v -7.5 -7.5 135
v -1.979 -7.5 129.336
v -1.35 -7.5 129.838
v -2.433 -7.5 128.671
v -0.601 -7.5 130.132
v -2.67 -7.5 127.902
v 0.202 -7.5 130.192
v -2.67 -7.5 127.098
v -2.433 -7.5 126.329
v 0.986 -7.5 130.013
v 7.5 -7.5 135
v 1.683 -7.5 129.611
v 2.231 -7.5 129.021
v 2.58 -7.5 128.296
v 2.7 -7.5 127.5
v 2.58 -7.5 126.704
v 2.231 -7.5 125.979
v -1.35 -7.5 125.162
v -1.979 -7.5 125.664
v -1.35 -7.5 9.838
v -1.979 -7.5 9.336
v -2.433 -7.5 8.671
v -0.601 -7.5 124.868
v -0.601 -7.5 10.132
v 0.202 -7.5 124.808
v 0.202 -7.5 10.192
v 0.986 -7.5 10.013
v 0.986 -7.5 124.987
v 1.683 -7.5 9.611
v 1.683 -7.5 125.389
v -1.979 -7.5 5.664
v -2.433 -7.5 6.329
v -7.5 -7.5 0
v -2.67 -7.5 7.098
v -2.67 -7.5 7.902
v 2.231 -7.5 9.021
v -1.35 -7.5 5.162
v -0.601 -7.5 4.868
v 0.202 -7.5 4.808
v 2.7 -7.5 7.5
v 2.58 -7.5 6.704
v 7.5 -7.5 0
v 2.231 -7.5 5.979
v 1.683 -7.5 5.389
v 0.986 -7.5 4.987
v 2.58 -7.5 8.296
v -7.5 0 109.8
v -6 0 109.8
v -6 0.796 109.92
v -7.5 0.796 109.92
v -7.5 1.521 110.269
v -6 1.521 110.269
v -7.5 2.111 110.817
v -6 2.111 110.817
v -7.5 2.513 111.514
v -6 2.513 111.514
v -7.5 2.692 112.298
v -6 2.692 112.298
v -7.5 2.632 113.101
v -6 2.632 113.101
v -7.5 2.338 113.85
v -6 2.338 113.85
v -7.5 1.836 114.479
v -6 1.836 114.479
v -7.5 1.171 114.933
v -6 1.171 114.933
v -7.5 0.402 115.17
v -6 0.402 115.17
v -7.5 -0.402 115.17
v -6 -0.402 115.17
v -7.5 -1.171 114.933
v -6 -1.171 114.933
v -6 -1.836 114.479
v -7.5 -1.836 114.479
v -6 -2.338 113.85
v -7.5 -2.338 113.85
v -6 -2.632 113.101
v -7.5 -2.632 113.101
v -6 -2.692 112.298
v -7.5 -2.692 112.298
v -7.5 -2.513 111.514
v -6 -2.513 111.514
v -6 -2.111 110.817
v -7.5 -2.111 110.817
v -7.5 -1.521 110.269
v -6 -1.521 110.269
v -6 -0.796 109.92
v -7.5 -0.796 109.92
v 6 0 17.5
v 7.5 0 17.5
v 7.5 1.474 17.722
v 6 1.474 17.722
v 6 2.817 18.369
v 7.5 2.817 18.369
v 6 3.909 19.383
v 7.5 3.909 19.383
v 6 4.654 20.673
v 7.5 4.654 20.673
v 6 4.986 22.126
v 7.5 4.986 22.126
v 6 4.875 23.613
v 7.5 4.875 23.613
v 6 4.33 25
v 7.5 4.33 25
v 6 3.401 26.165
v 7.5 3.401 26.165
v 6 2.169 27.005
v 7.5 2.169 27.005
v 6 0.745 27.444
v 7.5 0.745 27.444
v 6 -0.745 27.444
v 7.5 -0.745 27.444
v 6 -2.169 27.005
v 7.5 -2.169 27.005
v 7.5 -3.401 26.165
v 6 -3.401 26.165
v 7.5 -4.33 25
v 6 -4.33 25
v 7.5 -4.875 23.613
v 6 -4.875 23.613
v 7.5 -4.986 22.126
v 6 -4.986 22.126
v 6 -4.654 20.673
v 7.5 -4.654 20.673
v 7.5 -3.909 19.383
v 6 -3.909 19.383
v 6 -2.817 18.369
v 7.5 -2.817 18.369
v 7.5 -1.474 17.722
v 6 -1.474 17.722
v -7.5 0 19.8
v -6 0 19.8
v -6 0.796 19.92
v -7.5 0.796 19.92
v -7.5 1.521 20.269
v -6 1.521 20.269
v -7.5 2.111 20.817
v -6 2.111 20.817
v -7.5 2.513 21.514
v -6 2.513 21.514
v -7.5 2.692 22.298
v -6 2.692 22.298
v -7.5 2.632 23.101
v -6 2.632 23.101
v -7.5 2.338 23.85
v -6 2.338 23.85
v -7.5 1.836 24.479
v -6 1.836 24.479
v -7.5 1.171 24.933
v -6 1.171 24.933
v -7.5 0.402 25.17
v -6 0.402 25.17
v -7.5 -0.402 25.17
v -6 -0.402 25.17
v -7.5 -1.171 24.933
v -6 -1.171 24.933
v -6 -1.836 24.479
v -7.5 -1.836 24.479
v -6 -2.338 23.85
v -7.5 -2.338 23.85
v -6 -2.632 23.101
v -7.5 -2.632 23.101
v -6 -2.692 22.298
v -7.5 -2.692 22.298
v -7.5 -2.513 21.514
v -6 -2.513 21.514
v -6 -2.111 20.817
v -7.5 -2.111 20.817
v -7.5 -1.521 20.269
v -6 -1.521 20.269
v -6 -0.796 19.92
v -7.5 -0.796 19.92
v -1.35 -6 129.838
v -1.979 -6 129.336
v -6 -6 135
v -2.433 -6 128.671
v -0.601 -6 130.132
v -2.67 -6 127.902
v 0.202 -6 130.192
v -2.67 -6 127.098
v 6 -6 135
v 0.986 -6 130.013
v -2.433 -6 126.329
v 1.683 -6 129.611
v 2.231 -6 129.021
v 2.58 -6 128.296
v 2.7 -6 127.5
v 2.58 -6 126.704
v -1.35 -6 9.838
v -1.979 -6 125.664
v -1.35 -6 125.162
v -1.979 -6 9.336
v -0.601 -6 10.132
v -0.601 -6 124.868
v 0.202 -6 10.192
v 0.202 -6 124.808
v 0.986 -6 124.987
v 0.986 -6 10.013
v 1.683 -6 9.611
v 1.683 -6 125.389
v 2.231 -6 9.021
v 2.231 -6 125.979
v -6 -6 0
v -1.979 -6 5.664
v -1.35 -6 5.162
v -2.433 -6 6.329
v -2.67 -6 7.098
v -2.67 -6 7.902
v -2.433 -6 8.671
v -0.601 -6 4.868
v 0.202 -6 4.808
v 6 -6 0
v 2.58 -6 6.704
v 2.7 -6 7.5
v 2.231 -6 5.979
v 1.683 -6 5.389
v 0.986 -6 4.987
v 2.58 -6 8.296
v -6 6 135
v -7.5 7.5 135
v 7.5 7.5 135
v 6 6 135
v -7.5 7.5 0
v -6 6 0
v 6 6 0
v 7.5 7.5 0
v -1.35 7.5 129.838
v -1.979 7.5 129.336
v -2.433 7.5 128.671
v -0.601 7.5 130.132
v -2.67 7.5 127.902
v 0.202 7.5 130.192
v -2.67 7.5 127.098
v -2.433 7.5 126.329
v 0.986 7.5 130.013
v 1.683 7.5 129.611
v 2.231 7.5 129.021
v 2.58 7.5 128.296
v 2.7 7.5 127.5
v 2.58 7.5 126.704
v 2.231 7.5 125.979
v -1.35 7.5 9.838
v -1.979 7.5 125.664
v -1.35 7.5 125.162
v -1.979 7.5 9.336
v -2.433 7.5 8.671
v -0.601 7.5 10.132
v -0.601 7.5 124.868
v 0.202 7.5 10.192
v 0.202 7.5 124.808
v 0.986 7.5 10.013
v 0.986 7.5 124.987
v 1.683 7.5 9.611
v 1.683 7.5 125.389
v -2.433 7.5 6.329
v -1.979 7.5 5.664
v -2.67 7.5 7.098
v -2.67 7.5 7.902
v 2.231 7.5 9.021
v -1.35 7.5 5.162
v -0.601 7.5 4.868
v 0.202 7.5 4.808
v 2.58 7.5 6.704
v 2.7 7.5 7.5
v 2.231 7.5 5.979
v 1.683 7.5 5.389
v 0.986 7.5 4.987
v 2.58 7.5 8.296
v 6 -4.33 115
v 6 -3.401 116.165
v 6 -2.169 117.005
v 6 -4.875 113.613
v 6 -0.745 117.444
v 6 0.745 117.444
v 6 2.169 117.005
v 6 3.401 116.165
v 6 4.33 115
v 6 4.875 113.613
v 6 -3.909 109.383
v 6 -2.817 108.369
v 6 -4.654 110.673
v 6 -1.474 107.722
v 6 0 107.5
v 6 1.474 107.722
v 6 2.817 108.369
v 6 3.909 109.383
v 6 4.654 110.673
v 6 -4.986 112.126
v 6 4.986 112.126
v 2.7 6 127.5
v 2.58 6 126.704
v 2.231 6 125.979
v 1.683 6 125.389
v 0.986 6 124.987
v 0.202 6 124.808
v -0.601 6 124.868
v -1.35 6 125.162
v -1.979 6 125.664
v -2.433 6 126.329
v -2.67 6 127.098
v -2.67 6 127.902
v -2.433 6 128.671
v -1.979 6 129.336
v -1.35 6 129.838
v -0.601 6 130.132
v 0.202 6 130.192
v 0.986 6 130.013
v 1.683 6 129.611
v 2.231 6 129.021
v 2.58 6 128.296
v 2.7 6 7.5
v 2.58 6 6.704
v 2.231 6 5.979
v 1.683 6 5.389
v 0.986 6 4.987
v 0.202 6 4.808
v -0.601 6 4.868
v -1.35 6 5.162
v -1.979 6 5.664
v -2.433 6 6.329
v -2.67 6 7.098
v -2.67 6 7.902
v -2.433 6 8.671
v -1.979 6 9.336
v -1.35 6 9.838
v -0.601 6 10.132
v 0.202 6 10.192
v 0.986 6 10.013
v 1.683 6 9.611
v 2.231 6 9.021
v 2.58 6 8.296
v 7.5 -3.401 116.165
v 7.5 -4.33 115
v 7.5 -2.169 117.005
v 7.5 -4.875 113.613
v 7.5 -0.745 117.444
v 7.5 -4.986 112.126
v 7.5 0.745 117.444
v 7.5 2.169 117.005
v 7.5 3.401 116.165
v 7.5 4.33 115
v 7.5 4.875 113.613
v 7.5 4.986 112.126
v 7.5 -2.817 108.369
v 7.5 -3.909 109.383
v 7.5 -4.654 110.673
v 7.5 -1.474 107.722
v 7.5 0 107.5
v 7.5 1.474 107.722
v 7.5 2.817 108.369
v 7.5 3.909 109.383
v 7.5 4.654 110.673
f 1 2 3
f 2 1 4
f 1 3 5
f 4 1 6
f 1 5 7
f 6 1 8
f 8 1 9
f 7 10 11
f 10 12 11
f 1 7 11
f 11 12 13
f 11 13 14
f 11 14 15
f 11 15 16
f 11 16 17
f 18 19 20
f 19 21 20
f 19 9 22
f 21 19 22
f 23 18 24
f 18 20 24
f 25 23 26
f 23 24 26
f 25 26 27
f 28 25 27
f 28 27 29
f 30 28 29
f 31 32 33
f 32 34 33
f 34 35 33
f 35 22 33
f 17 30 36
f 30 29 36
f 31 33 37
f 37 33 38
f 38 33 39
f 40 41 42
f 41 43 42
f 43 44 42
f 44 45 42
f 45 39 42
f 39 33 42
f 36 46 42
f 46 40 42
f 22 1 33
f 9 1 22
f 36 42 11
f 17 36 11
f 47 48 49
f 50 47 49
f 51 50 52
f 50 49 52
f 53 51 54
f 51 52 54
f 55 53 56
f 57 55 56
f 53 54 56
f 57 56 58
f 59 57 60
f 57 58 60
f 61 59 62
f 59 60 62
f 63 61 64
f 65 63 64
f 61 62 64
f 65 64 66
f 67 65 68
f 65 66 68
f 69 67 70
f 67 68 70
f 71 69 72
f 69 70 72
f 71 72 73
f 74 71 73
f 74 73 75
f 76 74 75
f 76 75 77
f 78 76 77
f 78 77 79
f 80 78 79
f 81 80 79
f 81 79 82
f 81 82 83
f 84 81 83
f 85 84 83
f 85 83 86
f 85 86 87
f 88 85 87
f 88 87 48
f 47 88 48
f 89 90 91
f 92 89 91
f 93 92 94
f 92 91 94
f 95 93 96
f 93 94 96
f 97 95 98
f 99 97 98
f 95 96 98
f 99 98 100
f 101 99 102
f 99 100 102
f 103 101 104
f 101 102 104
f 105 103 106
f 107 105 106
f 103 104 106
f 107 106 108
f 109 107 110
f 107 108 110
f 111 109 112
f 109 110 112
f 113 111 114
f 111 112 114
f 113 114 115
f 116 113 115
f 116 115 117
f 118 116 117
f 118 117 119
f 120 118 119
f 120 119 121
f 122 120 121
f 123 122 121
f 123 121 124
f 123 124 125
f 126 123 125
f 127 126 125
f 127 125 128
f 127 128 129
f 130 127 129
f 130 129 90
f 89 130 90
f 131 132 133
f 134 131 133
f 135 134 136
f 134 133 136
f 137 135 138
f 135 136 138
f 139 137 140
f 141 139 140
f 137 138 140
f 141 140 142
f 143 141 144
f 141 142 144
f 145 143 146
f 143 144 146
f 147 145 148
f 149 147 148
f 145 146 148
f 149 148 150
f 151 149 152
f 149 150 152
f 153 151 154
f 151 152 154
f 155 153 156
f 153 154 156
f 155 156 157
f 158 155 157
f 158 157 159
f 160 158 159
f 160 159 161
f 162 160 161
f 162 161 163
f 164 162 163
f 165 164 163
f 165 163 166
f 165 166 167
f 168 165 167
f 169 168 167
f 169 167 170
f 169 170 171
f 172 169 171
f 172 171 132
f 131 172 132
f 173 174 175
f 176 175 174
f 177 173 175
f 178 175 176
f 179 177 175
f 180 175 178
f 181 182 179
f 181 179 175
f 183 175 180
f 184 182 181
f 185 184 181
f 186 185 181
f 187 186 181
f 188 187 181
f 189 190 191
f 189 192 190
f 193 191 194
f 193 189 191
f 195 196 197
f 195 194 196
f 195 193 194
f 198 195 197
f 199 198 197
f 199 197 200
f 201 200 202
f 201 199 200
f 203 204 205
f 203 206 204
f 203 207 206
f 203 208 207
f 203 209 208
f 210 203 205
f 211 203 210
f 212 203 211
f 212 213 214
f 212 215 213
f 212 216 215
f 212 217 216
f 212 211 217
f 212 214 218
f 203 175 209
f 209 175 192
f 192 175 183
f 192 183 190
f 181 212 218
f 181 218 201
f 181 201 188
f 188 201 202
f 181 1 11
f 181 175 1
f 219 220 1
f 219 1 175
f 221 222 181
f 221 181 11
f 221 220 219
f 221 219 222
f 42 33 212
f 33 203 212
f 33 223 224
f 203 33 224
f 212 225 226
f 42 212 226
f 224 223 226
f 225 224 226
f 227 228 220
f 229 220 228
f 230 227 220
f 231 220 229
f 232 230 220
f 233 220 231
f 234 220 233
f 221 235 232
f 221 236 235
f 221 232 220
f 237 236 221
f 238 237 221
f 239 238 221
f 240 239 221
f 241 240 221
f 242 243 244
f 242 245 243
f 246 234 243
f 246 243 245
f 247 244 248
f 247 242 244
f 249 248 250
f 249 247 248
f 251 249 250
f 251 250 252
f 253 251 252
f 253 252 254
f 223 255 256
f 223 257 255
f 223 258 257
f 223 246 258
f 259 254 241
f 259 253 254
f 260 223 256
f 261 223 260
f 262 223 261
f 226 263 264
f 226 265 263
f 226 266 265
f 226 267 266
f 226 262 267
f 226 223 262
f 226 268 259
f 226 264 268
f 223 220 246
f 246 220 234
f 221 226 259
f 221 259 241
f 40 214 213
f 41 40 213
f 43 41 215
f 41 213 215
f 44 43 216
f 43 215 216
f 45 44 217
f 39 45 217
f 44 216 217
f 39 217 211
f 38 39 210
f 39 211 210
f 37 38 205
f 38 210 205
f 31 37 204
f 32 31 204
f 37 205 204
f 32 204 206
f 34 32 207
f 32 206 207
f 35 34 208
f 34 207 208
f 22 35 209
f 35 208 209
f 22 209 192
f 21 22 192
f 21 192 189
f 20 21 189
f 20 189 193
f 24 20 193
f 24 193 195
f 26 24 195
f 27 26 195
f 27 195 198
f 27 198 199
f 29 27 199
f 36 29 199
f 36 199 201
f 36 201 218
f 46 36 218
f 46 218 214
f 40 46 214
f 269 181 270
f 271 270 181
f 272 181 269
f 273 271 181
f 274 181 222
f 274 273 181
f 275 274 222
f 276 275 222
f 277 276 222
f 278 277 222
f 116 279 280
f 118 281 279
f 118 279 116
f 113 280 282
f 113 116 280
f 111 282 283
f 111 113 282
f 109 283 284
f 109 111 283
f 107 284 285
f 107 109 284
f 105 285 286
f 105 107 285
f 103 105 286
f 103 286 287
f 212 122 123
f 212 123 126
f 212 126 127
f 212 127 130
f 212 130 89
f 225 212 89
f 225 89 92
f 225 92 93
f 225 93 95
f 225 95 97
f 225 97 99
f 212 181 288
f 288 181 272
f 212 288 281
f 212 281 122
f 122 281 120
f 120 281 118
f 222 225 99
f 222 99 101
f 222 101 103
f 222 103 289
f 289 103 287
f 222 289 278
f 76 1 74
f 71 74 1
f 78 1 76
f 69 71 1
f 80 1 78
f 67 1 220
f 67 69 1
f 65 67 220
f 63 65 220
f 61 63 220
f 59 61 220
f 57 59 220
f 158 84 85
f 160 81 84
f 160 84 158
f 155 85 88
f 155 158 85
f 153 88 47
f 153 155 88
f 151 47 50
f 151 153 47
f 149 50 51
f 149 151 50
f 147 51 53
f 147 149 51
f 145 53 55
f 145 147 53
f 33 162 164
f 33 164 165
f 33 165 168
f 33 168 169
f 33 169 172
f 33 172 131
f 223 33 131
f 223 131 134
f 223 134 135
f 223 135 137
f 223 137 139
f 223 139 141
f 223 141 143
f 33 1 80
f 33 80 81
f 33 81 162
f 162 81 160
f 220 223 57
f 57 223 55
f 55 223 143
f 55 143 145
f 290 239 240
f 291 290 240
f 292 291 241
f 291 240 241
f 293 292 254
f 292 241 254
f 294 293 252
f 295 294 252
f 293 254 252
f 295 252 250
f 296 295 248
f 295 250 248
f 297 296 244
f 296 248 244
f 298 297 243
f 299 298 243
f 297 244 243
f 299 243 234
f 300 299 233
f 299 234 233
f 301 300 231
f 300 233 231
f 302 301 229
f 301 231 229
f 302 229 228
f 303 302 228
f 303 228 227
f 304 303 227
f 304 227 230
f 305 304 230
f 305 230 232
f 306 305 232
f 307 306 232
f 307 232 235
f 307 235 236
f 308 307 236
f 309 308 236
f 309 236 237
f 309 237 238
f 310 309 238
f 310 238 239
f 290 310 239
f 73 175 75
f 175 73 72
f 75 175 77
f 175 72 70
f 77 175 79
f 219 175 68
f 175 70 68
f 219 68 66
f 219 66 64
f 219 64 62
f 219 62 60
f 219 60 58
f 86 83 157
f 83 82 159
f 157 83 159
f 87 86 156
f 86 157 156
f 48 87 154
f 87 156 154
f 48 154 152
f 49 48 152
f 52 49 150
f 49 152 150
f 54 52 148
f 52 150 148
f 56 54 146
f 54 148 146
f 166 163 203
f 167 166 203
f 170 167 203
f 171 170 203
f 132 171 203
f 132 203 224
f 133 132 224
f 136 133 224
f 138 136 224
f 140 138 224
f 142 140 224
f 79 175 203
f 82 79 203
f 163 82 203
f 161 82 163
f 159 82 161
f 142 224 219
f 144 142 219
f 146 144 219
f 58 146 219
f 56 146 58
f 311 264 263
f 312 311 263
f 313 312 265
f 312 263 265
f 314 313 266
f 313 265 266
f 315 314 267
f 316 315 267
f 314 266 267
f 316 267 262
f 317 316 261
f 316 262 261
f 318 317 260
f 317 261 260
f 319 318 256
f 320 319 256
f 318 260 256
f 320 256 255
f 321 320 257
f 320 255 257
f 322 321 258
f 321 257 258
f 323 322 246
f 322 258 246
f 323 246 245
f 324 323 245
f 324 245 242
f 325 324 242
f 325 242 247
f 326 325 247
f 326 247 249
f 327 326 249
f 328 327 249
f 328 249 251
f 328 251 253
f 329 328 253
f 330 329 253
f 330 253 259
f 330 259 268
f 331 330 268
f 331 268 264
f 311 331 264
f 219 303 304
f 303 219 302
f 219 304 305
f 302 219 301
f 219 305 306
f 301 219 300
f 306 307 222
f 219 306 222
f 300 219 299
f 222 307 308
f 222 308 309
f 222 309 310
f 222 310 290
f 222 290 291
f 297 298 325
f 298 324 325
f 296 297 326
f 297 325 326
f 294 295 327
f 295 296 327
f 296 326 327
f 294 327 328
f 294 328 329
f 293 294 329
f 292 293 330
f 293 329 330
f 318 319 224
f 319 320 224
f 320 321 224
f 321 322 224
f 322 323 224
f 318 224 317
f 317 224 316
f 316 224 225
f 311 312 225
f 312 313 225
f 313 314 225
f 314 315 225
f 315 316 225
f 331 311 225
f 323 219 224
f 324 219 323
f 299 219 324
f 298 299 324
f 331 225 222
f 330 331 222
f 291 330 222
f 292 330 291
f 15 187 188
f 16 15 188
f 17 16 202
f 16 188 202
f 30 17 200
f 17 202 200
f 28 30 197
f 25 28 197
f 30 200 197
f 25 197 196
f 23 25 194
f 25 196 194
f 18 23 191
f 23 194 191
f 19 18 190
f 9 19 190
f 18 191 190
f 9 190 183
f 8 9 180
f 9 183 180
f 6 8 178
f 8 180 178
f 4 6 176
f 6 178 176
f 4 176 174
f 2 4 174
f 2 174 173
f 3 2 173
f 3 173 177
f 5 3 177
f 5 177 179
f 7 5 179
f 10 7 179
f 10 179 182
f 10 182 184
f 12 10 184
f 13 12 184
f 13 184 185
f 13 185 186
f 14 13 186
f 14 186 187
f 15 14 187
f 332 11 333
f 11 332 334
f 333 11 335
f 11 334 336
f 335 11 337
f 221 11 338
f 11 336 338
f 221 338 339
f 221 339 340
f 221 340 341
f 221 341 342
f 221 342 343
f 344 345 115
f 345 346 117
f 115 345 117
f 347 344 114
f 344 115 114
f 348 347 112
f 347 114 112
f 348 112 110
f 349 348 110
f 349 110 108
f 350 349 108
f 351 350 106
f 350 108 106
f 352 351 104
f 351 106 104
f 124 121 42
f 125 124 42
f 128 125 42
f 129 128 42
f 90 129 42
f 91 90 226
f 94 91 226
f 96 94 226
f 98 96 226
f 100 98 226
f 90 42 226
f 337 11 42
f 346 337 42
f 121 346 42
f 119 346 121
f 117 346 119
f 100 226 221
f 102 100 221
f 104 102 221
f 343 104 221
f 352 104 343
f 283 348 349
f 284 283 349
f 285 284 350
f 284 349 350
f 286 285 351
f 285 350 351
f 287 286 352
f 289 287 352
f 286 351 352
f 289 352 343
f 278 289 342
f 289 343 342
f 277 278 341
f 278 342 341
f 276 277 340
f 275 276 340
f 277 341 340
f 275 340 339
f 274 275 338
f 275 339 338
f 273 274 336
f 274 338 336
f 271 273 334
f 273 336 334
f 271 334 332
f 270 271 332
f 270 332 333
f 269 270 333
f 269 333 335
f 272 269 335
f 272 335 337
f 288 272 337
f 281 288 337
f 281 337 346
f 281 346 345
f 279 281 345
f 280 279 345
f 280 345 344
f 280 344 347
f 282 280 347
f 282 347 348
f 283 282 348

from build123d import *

# Parameters (mm, degrees)
SKETCH_1_W          = 15
SKETCH_1_H          = 15
SKETCH_1_W_2        = 12
SKETCH_1_H_2        = 12
EXTRUDE_1_DEPTH     = 135
SKETCH_2_R          = 2.7
CUT_EXTRUDE_1_DEPTH = 25
SKETCH_3_R          = 2.7
CUT_EXTRUDE_2_DEPTH = 25
SKETCH_5_R          = 5
CUT_EXTRUDE_4_DEPTH = 10


with BuildPart() as part:
    # ｽｹｯﾁ1 → ﾎﾞｽ - 押し出し1 (new body)
    with BuildSketch(Plane.XY):
        Rectangle(SKETCH_1_W, SKETCH_1_H)
        Rectangle(SKETCH_1_W_2, SKETCH_1_H_2, mode=Mode.SUBTRACT)
    extrude(amount=EXTRUDE_1_DEPTH)

    # ｽｹｯﾁ2 → ｶｯﾄ - 押し出し1 (cut)
    with BuildSketch(Plane(origin=(7.5, 0, 0), x_dir=(0, 0, -1), z_dir=(1, 0, 0))):
        with Locations((-112.5, 0)):
            Circle(SKETCH_2_R)
        with Locations((-22.5, 0)):
            Circle(SKETCH_2_R)
    extrude(amount=-CUT_EXTRUDE_1_DEPTH, mode=Mode.SUBTRACT)

    # ｽｹｯﾁ3 → ｶｯﾄ - 押し出し2 (cut)
    with BuildSketch(Plane(origin=(0, 7.5, 0), x_dir=(1, 0, 0), z_dir=(0, 1, 0))):
        with Locations((0, -7.5)):
            Circle(SKETCH_3_R)
        with Locations((0, -127.5)):
            Circle(SKETCH_3_R)
    extrude(amount=-CUT_EXTRUDE_2_DEPTH, mode=Mode.SUBTRACT)

    # ｽｹｯﾁ5 → ｶｯﾄ - 押し出し4 (cut)
    with BuildSketch(Plane(origin=(7.5, 0, 0), x_dir=(0, 0, -1), z_dir=(1, 0, 0))):
        with Locations((-22.5, 0)):
            Circle(SKETCH_5_R)
        with Locations((-112.5, 0)):
            Circle(SKETCH_5_R)
    extrude(amount=-CUT_EXTRUDE_4_DEPTH, mode=Mode.SUBTRACT)


solid = part.part
